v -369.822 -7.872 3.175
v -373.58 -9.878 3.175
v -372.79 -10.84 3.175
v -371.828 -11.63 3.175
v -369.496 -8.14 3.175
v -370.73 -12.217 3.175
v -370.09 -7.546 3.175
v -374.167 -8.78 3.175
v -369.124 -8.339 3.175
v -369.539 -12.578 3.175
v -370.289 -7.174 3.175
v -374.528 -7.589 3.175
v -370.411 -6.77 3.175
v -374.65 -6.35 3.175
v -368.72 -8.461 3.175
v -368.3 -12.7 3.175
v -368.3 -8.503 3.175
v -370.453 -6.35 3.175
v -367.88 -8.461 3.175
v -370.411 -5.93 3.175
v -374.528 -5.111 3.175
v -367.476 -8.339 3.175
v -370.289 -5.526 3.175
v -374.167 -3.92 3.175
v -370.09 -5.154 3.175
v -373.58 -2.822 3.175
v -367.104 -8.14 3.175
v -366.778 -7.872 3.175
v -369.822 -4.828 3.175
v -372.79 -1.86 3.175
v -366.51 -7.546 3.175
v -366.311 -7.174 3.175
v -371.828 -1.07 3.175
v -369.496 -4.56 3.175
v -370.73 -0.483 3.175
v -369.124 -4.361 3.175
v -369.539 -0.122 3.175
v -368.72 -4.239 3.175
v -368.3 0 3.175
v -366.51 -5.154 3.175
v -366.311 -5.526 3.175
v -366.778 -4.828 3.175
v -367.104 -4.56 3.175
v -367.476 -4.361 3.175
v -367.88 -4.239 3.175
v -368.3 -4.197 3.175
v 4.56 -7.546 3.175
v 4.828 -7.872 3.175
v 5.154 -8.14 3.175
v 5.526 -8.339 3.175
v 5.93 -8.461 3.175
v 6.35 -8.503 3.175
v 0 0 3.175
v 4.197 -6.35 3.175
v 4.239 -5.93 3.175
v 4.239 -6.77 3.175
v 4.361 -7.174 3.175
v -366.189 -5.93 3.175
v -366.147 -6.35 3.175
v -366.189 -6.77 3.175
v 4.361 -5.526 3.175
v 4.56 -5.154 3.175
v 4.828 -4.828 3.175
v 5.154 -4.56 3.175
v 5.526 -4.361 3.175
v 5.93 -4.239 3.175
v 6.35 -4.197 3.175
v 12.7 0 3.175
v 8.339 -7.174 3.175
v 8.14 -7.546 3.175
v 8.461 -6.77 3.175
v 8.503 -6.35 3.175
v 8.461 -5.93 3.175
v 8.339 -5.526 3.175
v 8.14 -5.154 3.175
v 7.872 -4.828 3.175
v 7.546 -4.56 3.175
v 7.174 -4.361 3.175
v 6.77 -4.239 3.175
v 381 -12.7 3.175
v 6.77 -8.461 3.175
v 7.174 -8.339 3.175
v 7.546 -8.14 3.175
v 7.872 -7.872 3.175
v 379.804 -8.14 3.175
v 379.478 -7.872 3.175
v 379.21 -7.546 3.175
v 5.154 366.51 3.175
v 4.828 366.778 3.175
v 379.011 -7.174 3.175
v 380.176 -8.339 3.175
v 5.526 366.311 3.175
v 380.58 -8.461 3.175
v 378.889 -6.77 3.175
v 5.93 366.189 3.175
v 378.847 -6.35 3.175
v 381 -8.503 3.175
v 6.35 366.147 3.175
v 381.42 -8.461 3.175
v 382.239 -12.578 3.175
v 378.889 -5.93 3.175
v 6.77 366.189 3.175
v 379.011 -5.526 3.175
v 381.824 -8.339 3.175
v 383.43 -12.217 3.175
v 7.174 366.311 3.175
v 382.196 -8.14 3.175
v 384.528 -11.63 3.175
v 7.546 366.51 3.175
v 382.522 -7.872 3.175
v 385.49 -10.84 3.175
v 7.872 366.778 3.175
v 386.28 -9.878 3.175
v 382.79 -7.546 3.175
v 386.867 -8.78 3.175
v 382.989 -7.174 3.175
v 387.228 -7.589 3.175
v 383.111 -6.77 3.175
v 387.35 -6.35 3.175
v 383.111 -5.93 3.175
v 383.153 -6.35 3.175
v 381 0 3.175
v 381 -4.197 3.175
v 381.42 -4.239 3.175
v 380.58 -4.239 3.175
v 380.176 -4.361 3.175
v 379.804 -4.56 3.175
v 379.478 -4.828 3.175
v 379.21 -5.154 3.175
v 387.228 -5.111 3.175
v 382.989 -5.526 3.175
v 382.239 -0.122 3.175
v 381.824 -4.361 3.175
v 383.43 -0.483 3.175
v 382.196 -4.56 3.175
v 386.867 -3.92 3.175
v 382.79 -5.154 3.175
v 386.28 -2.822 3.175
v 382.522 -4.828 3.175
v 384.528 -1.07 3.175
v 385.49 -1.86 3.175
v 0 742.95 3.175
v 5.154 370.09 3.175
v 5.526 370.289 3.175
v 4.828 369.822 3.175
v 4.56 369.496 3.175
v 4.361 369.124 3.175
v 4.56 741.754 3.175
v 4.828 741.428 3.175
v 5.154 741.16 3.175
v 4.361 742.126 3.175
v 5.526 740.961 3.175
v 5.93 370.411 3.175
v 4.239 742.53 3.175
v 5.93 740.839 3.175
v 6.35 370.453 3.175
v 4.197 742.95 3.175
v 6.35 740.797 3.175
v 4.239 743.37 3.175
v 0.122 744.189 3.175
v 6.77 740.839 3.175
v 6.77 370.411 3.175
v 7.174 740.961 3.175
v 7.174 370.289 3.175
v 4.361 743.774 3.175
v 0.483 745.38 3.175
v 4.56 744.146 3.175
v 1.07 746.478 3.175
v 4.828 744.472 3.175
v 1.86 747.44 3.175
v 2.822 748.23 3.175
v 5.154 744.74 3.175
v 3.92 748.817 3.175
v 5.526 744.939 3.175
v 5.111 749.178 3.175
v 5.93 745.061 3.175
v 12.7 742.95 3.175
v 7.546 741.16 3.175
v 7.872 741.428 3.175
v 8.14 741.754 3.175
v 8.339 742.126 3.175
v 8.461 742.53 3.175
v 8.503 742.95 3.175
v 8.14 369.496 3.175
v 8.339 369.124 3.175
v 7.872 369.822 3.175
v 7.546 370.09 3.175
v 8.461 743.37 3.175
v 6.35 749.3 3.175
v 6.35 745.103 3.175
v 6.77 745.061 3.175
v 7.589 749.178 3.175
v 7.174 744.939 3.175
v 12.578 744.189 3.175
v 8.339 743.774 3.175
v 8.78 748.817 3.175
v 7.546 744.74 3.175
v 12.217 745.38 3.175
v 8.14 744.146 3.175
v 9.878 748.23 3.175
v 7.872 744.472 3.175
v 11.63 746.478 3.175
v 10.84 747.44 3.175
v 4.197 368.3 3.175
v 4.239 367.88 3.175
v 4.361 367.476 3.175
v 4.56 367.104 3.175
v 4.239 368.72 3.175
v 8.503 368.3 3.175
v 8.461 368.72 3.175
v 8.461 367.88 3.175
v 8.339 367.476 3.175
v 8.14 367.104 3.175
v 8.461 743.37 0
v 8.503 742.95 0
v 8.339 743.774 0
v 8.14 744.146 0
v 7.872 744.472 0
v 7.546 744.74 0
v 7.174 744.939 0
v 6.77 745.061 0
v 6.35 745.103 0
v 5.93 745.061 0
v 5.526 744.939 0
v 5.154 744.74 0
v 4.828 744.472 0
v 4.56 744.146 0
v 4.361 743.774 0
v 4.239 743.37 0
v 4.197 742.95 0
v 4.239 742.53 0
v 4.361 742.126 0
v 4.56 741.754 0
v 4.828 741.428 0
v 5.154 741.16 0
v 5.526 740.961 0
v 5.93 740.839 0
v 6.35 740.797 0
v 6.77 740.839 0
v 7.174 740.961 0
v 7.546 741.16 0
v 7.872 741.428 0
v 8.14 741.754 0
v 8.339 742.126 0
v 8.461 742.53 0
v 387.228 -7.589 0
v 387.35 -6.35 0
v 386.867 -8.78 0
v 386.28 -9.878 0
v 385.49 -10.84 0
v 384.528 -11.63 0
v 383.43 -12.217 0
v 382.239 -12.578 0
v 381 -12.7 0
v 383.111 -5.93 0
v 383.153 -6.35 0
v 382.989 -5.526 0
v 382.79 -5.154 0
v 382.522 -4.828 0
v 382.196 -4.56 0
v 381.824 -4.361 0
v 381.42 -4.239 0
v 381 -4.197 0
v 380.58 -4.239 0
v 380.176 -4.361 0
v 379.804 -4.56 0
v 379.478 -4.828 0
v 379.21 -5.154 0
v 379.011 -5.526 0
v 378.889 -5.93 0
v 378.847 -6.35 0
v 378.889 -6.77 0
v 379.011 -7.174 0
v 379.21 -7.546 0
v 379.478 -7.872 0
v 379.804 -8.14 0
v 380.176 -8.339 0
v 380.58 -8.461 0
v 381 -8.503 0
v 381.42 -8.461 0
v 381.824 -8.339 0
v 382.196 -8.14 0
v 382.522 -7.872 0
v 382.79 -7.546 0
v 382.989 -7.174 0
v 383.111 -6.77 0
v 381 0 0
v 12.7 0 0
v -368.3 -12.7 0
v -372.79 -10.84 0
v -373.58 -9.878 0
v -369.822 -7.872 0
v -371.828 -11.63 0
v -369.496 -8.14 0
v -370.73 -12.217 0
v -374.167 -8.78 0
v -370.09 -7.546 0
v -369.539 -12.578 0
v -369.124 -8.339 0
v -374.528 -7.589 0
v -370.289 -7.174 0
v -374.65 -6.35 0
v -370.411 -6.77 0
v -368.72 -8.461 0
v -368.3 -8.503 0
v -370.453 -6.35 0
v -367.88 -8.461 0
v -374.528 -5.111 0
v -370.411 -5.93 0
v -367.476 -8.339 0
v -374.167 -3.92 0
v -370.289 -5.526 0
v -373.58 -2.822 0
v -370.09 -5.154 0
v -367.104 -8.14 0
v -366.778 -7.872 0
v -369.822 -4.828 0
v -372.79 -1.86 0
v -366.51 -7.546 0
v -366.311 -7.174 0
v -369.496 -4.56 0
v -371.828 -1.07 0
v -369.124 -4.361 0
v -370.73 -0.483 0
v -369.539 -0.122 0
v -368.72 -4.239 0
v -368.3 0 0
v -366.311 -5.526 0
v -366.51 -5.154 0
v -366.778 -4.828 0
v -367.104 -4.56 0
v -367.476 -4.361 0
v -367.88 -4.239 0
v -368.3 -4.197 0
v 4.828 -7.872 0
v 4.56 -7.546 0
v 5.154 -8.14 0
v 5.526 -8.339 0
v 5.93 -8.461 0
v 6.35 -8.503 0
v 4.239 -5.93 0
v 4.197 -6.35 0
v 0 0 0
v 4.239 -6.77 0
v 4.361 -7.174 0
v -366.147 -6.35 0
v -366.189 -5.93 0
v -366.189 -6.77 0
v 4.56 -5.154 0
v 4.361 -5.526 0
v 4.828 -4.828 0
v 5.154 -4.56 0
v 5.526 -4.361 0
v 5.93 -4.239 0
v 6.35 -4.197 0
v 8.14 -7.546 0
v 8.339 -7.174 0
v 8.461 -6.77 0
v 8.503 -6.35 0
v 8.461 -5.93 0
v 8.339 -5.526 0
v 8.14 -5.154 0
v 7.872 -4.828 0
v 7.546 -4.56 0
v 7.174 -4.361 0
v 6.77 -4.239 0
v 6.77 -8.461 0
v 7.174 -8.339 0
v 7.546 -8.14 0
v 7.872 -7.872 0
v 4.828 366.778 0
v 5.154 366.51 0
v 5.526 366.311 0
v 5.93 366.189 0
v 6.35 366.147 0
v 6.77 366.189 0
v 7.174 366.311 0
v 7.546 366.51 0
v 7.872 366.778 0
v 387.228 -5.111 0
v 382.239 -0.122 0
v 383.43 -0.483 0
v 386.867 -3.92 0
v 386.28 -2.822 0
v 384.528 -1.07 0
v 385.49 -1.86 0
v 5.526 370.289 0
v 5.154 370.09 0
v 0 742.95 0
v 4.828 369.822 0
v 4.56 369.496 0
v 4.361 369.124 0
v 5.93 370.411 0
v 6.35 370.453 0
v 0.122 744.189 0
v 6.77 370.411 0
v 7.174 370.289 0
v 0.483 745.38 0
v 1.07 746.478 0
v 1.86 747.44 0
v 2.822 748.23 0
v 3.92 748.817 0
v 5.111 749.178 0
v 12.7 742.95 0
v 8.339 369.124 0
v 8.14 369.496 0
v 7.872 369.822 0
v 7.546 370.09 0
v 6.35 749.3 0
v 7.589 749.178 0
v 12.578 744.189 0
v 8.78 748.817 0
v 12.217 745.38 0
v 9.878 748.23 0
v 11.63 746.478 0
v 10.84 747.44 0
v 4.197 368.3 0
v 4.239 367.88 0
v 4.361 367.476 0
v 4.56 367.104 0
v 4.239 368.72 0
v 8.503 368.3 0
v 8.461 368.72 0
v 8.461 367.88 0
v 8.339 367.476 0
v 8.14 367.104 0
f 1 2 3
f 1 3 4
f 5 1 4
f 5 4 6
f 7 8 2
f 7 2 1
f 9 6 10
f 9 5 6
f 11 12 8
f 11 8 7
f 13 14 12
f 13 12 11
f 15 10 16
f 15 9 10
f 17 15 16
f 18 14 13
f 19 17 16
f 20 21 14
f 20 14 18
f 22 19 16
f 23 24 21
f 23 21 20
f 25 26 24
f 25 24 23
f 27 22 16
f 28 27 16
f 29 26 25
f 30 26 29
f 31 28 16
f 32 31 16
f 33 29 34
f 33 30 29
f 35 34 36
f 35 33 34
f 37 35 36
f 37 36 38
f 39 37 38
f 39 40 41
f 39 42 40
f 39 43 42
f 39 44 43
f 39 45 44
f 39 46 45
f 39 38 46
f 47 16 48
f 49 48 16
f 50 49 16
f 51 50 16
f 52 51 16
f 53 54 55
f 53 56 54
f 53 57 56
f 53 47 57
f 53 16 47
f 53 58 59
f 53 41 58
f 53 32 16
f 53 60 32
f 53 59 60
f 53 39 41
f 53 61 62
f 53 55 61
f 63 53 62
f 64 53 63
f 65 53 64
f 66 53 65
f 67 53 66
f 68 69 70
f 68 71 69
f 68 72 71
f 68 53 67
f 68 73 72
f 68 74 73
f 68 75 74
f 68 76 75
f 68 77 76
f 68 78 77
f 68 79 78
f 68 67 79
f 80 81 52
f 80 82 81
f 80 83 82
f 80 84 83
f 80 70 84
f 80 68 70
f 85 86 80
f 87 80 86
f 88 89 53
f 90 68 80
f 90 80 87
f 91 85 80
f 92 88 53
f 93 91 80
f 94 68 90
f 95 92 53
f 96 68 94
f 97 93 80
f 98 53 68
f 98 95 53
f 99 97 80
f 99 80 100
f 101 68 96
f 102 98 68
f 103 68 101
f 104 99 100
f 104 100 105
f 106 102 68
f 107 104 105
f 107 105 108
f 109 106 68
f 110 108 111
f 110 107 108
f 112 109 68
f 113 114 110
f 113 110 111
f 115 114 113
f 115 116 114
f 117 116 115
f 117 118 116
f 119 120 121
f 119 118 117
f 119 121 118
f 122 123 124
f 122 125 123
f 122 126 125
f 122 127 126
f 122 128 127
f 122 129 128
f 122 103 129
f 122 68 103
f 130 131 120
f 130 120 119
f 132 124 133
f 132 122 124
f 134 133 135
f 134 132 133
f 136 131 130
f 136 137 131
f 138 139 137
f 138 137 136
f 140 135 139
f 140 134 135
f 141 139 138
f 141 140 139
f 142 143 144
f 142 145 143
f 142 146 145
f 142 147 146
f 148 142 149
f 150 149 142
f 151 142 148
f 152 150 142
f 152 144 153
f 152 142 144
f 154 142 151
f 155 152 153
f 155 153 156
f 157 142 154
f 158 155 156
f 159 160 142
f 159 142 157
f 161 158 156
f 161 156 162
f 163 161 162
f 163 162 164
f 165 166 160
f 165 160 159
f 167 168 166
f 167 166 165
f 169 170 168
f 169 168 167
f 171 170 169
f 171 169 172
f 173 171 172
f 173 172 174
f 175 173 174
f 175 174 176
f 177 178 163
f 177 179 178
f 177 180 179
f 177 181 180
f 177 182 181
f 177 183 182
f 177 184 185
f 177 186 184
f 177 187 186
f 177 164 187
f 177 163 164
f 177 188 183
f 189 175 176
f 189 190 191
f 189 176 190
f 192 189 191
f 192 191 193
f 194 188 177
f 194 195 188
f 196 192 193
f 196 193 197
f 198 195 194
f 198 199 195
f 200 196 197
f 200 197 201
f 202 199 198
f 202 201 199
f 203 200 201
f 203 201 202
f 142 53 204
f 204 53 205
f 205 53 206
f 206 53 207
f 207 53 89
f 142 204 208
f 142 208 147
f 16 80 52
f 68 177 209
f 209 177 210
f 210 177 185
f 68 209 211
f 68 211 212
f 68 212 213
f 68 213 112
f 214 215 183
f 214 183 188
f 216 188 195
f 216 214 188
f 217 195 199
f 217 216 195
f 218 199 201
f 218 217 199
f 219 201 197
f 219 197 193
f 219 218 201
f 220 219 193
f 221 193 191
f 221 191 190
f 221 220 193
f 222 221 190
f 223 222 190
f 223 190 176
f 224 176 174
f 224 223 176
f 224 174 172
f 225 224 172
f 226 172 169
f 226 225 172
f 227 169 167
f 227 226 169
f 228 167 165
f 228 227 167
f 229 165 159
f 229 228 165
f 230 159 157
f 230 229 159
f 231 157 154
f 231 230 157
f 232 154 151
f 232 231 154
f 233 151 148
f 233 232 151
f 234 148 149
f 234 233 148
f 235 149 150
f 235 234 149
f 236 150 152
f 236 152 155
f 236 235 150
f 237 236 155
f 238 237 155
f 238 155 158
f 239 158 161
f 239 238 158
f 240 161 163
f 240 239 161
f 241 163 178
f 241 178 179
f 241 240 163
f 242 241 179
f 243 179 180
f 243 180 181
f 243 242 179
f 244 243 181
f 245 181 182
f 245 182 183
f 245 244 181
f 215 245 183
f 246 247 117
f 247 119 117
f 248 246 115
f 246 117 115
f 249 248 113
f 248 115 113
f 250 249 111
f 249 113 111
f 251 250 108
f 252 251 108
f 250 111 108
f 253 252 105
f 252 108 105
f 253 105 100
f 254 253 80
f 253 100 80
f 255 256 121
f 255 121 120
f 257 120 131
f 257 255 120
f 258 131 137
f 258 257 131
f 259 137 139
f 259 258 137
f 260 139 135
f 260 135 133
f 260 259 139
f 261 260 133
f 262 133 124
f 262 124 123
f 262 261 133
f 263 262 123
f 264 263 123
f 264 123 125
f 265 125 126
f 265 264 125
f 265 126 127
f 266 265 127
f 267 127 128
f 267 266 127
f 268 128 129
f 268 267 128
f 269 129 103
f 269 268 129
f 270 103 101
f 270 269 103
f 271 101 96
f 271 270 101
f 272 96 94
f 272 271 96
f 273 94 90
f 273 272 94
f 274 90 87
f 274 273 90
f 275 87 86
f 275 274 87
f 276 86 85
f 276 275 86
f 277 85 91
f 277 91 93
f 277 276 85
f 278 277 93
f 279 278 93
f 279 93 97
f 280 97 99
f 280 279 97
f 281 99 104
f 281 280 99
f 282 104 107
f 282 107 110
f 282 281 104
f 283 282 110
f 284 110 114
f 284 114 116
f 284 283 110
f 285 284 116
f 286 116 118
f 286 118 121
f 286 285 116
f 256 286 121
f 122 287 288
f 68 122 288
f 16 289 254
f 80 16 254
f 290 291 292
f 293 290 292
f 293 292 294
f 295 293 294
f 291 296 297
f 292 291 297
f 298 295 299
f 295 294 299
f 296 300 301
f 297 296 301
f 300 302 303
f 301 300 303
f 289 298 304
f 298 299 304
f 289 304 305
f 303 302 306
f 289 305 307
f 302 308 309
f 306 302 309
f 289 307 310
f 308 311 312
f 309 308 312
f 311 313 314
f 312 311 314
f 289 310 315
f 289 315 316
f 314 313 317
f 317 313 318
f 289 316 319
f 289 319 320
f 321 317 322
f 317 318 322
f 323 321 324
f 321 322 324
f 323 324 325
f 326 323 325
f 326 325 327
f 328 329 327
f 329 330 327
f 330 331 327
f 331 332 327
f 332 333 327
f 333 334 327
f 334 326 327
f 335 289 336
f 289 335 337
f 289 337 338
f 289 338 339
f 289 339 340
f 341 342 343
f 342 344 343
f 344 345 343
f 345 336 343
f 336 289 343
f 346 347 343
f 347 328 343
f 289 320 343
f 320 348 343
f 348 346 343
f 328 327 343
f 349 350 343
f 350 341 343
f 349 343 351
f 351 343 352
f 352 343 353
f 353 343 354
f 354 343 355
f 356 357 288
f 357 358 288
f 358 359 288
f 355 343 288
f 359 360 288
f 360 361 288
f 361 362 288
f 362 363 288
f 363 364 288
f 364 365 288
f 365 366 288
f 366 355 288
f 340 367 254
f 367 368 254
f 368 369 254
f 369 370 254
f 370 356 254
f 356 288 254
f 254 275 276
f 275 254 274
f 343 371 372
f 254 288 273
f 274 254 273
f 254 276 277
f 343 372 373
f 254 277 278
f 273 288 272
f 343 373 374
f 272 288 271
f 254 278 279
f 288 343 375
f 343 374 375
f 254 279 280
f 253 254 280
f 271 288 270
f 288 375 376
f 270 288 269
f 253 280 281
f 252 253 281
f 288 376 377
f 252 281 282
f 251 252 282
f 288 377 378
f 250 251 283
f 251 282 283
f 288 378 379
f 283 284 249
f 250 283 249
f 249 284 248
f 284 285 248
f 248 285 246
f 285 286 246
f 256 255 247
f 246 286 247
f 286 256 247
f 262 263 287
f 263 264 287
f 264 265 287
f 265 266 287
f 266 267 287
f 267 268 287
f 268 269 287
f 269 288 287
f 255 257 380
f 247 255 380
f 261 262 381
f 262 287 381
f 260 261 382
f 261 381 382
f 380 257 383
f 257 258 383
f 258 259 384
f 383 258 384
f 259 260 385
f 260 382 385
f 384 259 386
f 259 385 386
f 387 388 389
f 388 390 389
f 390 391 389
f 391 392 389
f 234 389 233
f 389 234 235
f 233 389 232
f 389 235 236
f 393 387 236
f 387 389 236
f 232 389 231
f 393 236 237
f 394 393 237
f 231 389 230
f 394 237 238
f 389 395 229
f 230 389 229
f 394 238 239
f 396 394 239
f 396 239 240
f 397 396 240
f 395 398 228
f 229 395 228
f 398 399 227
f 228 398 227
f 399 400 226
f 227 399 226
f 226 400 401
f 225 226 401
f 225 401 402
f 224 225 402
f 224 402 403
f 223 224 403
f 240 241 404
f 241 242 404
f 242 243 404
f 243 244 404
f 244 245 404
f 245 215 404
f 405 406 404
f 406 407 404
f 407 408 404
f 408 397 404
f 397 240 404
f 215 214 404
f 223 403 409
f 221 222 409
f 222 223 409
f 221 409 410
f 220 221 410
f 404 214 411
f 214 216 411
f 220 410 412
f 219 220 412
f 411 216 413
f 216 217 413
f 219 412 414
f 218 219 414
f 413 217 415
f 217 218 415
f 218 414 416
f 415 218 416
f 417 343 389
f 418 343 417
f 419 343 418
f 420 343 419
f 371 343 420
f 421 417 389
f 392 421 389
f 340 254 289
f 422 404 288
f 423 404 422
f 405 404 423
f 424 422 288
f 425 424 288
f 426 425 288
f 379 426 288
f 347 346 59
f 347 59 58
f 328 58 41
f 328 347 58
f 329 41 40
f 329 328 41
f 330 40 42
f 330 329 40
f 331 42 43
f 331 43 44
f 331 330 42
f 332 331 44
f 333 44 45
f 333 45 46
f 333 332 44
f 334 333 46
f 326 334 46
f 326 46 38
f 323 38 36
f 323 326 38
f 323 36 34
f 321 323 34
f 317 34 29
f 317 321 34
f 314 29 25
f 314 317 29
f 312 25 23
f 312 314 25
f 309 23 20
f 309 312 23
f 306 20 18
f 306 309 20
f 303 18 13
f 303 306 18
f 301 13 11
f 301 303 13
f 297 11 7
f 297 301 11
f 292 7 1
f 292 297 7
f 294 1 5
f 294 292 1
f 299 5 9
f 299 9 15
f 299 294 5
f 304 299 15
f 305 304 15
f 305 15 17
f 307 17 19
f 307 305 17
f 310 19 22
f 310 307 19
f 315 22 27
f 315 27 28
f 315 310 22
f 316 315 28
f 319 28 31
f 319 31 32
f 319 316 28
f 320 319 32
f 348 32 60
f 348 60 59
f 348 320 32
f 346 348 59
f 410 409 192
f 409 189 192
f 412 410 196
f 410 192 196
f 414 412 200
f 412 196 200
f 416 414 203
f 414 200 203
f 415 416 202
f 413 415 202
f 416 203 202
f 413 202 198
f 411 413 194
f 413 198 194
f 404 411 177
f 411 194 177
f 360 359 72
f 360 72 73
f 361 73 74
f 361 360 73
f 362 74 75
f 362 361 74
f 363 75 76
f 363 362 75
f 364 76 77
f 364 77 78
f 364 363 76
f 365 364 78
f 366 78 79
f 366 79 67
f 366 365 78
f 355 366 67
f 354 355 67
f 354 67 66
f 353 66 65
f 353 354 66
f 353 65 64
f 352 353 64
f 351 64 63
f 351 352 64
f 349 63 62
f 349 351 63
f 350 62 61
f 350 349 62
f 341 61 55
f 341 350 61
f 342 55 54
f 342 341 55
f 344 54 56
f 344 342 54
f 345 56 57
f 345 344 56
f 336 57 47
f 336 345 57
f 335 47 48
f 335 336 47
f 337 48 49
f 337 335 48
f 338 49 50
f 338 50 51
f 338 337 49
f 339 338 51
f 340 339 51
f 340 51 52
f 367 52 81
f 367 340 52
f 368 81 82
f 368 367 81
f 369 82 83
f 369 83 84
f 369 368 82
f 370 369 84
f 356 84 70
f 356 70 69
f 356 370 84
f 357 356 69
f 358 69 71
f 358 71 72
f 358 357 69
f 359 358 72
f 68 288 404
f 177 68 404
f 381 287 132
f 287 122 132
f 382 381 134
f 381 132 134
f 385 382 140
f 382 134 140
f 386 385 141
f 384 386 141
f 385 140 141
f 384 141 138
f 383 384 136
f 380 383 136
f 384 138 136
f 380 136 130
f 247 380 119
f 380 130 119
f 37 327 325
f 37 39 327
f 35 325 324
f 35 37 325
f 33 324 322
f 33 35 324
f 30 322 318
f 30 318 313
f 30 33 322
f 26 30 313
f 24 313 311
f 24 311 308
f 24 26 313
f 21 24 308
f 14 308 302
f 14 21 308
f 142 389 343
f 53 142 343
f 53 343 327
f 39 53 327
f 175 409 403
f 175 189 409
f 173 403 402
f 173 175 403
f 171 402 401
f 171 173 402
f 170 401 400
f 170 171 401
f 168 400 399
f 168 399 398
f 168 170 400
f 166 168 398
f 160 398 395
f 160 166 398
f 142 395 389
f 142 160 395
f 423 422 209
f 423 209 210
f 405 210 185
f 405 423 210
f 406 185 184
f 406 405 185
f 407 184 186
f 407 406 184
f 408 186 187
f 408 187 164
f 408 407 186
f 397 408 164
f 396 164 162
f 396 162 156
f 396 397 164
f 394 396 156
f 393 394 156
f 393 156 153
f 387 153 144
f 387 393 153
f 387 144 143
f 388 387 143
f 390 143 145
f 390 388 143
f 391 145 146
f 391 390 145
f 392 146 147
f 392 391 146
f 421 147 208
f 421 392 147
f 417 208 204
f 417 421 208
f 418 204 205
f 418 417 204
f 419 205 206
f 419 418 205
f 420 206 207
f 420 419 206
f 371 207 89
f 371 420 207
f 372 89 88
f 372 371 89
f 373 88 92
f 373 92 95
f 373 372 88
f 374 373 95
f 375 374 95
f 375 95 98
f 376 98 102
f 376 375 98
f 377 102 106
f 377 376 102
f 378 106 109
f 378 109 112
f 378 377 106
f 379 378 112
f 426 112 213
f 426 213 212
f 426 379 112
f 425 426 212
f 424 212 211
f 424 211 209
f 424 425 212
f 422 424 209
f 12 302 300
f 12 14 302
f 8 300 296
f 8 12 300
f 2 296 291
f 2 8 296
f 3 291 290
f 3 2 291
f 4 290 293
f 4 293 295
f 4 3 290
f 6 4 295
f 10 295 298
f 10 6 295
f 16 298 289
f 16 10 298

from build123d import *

# Parameters (mm, degrees)
F0_R     = 2.15265
F1_DEPTH = 3.175
F2_R     = 6.34999


# Not quite as in the source:
# - a fillet or chamfer is up to 0.001 mm smaller than in the source, because OpenCascade refuses the exact size


with BuildPart() as f1:
    # F0 (on Top) → F1 (new body)
    with BuildSketch(Plane.XY):
        Polygon((12.7, 749.3), (0, 749.3), (0, 0), (-374.65, 0), (-374.65, -12.7), (387.35, -12.7), (387.35, 0), (12.7, 0), align=None)
        with Locations((-368.3, -6.35)):
            Circle(F0_R, mode=Mode.SUBTRACT)
        with Locations((6.35, -6.35)):
            Circle(F0_R, mode=Mode.SUBTRACT)
        with Locations((381, -6.35)):
            Circle(F0_R, mode=Mode.SUBTRACT)
        with Locations((6.35, 368.3)):
            Circle(F0_R, mode=Mode.SUBTRACT)
        with Locations((6.35, 742.95)):
            Circle(F0_R, mode=Mode.SUBTRACT)
    extrude(amount=F1_DEPTH)

    # F2 (radius 6.35 in the source; OpenCascade refuses exactly that, so slightly less here)
    f2_edges = [f1.edges().sort_by_distance(p)[0] for p in [
        (0, 749.3, 1.5875),
        (12.7, 749.3, 1.5875),
        (387.35, -12.7, 1.5875),
        (387.35, 0, 1.5875),
        (-374.65, -12.7, 1.5875),
        (-374.65, 0, 1.5875),
    ]]
    fillet(f2_edges, radius=F2_R)


solid = f1.part
